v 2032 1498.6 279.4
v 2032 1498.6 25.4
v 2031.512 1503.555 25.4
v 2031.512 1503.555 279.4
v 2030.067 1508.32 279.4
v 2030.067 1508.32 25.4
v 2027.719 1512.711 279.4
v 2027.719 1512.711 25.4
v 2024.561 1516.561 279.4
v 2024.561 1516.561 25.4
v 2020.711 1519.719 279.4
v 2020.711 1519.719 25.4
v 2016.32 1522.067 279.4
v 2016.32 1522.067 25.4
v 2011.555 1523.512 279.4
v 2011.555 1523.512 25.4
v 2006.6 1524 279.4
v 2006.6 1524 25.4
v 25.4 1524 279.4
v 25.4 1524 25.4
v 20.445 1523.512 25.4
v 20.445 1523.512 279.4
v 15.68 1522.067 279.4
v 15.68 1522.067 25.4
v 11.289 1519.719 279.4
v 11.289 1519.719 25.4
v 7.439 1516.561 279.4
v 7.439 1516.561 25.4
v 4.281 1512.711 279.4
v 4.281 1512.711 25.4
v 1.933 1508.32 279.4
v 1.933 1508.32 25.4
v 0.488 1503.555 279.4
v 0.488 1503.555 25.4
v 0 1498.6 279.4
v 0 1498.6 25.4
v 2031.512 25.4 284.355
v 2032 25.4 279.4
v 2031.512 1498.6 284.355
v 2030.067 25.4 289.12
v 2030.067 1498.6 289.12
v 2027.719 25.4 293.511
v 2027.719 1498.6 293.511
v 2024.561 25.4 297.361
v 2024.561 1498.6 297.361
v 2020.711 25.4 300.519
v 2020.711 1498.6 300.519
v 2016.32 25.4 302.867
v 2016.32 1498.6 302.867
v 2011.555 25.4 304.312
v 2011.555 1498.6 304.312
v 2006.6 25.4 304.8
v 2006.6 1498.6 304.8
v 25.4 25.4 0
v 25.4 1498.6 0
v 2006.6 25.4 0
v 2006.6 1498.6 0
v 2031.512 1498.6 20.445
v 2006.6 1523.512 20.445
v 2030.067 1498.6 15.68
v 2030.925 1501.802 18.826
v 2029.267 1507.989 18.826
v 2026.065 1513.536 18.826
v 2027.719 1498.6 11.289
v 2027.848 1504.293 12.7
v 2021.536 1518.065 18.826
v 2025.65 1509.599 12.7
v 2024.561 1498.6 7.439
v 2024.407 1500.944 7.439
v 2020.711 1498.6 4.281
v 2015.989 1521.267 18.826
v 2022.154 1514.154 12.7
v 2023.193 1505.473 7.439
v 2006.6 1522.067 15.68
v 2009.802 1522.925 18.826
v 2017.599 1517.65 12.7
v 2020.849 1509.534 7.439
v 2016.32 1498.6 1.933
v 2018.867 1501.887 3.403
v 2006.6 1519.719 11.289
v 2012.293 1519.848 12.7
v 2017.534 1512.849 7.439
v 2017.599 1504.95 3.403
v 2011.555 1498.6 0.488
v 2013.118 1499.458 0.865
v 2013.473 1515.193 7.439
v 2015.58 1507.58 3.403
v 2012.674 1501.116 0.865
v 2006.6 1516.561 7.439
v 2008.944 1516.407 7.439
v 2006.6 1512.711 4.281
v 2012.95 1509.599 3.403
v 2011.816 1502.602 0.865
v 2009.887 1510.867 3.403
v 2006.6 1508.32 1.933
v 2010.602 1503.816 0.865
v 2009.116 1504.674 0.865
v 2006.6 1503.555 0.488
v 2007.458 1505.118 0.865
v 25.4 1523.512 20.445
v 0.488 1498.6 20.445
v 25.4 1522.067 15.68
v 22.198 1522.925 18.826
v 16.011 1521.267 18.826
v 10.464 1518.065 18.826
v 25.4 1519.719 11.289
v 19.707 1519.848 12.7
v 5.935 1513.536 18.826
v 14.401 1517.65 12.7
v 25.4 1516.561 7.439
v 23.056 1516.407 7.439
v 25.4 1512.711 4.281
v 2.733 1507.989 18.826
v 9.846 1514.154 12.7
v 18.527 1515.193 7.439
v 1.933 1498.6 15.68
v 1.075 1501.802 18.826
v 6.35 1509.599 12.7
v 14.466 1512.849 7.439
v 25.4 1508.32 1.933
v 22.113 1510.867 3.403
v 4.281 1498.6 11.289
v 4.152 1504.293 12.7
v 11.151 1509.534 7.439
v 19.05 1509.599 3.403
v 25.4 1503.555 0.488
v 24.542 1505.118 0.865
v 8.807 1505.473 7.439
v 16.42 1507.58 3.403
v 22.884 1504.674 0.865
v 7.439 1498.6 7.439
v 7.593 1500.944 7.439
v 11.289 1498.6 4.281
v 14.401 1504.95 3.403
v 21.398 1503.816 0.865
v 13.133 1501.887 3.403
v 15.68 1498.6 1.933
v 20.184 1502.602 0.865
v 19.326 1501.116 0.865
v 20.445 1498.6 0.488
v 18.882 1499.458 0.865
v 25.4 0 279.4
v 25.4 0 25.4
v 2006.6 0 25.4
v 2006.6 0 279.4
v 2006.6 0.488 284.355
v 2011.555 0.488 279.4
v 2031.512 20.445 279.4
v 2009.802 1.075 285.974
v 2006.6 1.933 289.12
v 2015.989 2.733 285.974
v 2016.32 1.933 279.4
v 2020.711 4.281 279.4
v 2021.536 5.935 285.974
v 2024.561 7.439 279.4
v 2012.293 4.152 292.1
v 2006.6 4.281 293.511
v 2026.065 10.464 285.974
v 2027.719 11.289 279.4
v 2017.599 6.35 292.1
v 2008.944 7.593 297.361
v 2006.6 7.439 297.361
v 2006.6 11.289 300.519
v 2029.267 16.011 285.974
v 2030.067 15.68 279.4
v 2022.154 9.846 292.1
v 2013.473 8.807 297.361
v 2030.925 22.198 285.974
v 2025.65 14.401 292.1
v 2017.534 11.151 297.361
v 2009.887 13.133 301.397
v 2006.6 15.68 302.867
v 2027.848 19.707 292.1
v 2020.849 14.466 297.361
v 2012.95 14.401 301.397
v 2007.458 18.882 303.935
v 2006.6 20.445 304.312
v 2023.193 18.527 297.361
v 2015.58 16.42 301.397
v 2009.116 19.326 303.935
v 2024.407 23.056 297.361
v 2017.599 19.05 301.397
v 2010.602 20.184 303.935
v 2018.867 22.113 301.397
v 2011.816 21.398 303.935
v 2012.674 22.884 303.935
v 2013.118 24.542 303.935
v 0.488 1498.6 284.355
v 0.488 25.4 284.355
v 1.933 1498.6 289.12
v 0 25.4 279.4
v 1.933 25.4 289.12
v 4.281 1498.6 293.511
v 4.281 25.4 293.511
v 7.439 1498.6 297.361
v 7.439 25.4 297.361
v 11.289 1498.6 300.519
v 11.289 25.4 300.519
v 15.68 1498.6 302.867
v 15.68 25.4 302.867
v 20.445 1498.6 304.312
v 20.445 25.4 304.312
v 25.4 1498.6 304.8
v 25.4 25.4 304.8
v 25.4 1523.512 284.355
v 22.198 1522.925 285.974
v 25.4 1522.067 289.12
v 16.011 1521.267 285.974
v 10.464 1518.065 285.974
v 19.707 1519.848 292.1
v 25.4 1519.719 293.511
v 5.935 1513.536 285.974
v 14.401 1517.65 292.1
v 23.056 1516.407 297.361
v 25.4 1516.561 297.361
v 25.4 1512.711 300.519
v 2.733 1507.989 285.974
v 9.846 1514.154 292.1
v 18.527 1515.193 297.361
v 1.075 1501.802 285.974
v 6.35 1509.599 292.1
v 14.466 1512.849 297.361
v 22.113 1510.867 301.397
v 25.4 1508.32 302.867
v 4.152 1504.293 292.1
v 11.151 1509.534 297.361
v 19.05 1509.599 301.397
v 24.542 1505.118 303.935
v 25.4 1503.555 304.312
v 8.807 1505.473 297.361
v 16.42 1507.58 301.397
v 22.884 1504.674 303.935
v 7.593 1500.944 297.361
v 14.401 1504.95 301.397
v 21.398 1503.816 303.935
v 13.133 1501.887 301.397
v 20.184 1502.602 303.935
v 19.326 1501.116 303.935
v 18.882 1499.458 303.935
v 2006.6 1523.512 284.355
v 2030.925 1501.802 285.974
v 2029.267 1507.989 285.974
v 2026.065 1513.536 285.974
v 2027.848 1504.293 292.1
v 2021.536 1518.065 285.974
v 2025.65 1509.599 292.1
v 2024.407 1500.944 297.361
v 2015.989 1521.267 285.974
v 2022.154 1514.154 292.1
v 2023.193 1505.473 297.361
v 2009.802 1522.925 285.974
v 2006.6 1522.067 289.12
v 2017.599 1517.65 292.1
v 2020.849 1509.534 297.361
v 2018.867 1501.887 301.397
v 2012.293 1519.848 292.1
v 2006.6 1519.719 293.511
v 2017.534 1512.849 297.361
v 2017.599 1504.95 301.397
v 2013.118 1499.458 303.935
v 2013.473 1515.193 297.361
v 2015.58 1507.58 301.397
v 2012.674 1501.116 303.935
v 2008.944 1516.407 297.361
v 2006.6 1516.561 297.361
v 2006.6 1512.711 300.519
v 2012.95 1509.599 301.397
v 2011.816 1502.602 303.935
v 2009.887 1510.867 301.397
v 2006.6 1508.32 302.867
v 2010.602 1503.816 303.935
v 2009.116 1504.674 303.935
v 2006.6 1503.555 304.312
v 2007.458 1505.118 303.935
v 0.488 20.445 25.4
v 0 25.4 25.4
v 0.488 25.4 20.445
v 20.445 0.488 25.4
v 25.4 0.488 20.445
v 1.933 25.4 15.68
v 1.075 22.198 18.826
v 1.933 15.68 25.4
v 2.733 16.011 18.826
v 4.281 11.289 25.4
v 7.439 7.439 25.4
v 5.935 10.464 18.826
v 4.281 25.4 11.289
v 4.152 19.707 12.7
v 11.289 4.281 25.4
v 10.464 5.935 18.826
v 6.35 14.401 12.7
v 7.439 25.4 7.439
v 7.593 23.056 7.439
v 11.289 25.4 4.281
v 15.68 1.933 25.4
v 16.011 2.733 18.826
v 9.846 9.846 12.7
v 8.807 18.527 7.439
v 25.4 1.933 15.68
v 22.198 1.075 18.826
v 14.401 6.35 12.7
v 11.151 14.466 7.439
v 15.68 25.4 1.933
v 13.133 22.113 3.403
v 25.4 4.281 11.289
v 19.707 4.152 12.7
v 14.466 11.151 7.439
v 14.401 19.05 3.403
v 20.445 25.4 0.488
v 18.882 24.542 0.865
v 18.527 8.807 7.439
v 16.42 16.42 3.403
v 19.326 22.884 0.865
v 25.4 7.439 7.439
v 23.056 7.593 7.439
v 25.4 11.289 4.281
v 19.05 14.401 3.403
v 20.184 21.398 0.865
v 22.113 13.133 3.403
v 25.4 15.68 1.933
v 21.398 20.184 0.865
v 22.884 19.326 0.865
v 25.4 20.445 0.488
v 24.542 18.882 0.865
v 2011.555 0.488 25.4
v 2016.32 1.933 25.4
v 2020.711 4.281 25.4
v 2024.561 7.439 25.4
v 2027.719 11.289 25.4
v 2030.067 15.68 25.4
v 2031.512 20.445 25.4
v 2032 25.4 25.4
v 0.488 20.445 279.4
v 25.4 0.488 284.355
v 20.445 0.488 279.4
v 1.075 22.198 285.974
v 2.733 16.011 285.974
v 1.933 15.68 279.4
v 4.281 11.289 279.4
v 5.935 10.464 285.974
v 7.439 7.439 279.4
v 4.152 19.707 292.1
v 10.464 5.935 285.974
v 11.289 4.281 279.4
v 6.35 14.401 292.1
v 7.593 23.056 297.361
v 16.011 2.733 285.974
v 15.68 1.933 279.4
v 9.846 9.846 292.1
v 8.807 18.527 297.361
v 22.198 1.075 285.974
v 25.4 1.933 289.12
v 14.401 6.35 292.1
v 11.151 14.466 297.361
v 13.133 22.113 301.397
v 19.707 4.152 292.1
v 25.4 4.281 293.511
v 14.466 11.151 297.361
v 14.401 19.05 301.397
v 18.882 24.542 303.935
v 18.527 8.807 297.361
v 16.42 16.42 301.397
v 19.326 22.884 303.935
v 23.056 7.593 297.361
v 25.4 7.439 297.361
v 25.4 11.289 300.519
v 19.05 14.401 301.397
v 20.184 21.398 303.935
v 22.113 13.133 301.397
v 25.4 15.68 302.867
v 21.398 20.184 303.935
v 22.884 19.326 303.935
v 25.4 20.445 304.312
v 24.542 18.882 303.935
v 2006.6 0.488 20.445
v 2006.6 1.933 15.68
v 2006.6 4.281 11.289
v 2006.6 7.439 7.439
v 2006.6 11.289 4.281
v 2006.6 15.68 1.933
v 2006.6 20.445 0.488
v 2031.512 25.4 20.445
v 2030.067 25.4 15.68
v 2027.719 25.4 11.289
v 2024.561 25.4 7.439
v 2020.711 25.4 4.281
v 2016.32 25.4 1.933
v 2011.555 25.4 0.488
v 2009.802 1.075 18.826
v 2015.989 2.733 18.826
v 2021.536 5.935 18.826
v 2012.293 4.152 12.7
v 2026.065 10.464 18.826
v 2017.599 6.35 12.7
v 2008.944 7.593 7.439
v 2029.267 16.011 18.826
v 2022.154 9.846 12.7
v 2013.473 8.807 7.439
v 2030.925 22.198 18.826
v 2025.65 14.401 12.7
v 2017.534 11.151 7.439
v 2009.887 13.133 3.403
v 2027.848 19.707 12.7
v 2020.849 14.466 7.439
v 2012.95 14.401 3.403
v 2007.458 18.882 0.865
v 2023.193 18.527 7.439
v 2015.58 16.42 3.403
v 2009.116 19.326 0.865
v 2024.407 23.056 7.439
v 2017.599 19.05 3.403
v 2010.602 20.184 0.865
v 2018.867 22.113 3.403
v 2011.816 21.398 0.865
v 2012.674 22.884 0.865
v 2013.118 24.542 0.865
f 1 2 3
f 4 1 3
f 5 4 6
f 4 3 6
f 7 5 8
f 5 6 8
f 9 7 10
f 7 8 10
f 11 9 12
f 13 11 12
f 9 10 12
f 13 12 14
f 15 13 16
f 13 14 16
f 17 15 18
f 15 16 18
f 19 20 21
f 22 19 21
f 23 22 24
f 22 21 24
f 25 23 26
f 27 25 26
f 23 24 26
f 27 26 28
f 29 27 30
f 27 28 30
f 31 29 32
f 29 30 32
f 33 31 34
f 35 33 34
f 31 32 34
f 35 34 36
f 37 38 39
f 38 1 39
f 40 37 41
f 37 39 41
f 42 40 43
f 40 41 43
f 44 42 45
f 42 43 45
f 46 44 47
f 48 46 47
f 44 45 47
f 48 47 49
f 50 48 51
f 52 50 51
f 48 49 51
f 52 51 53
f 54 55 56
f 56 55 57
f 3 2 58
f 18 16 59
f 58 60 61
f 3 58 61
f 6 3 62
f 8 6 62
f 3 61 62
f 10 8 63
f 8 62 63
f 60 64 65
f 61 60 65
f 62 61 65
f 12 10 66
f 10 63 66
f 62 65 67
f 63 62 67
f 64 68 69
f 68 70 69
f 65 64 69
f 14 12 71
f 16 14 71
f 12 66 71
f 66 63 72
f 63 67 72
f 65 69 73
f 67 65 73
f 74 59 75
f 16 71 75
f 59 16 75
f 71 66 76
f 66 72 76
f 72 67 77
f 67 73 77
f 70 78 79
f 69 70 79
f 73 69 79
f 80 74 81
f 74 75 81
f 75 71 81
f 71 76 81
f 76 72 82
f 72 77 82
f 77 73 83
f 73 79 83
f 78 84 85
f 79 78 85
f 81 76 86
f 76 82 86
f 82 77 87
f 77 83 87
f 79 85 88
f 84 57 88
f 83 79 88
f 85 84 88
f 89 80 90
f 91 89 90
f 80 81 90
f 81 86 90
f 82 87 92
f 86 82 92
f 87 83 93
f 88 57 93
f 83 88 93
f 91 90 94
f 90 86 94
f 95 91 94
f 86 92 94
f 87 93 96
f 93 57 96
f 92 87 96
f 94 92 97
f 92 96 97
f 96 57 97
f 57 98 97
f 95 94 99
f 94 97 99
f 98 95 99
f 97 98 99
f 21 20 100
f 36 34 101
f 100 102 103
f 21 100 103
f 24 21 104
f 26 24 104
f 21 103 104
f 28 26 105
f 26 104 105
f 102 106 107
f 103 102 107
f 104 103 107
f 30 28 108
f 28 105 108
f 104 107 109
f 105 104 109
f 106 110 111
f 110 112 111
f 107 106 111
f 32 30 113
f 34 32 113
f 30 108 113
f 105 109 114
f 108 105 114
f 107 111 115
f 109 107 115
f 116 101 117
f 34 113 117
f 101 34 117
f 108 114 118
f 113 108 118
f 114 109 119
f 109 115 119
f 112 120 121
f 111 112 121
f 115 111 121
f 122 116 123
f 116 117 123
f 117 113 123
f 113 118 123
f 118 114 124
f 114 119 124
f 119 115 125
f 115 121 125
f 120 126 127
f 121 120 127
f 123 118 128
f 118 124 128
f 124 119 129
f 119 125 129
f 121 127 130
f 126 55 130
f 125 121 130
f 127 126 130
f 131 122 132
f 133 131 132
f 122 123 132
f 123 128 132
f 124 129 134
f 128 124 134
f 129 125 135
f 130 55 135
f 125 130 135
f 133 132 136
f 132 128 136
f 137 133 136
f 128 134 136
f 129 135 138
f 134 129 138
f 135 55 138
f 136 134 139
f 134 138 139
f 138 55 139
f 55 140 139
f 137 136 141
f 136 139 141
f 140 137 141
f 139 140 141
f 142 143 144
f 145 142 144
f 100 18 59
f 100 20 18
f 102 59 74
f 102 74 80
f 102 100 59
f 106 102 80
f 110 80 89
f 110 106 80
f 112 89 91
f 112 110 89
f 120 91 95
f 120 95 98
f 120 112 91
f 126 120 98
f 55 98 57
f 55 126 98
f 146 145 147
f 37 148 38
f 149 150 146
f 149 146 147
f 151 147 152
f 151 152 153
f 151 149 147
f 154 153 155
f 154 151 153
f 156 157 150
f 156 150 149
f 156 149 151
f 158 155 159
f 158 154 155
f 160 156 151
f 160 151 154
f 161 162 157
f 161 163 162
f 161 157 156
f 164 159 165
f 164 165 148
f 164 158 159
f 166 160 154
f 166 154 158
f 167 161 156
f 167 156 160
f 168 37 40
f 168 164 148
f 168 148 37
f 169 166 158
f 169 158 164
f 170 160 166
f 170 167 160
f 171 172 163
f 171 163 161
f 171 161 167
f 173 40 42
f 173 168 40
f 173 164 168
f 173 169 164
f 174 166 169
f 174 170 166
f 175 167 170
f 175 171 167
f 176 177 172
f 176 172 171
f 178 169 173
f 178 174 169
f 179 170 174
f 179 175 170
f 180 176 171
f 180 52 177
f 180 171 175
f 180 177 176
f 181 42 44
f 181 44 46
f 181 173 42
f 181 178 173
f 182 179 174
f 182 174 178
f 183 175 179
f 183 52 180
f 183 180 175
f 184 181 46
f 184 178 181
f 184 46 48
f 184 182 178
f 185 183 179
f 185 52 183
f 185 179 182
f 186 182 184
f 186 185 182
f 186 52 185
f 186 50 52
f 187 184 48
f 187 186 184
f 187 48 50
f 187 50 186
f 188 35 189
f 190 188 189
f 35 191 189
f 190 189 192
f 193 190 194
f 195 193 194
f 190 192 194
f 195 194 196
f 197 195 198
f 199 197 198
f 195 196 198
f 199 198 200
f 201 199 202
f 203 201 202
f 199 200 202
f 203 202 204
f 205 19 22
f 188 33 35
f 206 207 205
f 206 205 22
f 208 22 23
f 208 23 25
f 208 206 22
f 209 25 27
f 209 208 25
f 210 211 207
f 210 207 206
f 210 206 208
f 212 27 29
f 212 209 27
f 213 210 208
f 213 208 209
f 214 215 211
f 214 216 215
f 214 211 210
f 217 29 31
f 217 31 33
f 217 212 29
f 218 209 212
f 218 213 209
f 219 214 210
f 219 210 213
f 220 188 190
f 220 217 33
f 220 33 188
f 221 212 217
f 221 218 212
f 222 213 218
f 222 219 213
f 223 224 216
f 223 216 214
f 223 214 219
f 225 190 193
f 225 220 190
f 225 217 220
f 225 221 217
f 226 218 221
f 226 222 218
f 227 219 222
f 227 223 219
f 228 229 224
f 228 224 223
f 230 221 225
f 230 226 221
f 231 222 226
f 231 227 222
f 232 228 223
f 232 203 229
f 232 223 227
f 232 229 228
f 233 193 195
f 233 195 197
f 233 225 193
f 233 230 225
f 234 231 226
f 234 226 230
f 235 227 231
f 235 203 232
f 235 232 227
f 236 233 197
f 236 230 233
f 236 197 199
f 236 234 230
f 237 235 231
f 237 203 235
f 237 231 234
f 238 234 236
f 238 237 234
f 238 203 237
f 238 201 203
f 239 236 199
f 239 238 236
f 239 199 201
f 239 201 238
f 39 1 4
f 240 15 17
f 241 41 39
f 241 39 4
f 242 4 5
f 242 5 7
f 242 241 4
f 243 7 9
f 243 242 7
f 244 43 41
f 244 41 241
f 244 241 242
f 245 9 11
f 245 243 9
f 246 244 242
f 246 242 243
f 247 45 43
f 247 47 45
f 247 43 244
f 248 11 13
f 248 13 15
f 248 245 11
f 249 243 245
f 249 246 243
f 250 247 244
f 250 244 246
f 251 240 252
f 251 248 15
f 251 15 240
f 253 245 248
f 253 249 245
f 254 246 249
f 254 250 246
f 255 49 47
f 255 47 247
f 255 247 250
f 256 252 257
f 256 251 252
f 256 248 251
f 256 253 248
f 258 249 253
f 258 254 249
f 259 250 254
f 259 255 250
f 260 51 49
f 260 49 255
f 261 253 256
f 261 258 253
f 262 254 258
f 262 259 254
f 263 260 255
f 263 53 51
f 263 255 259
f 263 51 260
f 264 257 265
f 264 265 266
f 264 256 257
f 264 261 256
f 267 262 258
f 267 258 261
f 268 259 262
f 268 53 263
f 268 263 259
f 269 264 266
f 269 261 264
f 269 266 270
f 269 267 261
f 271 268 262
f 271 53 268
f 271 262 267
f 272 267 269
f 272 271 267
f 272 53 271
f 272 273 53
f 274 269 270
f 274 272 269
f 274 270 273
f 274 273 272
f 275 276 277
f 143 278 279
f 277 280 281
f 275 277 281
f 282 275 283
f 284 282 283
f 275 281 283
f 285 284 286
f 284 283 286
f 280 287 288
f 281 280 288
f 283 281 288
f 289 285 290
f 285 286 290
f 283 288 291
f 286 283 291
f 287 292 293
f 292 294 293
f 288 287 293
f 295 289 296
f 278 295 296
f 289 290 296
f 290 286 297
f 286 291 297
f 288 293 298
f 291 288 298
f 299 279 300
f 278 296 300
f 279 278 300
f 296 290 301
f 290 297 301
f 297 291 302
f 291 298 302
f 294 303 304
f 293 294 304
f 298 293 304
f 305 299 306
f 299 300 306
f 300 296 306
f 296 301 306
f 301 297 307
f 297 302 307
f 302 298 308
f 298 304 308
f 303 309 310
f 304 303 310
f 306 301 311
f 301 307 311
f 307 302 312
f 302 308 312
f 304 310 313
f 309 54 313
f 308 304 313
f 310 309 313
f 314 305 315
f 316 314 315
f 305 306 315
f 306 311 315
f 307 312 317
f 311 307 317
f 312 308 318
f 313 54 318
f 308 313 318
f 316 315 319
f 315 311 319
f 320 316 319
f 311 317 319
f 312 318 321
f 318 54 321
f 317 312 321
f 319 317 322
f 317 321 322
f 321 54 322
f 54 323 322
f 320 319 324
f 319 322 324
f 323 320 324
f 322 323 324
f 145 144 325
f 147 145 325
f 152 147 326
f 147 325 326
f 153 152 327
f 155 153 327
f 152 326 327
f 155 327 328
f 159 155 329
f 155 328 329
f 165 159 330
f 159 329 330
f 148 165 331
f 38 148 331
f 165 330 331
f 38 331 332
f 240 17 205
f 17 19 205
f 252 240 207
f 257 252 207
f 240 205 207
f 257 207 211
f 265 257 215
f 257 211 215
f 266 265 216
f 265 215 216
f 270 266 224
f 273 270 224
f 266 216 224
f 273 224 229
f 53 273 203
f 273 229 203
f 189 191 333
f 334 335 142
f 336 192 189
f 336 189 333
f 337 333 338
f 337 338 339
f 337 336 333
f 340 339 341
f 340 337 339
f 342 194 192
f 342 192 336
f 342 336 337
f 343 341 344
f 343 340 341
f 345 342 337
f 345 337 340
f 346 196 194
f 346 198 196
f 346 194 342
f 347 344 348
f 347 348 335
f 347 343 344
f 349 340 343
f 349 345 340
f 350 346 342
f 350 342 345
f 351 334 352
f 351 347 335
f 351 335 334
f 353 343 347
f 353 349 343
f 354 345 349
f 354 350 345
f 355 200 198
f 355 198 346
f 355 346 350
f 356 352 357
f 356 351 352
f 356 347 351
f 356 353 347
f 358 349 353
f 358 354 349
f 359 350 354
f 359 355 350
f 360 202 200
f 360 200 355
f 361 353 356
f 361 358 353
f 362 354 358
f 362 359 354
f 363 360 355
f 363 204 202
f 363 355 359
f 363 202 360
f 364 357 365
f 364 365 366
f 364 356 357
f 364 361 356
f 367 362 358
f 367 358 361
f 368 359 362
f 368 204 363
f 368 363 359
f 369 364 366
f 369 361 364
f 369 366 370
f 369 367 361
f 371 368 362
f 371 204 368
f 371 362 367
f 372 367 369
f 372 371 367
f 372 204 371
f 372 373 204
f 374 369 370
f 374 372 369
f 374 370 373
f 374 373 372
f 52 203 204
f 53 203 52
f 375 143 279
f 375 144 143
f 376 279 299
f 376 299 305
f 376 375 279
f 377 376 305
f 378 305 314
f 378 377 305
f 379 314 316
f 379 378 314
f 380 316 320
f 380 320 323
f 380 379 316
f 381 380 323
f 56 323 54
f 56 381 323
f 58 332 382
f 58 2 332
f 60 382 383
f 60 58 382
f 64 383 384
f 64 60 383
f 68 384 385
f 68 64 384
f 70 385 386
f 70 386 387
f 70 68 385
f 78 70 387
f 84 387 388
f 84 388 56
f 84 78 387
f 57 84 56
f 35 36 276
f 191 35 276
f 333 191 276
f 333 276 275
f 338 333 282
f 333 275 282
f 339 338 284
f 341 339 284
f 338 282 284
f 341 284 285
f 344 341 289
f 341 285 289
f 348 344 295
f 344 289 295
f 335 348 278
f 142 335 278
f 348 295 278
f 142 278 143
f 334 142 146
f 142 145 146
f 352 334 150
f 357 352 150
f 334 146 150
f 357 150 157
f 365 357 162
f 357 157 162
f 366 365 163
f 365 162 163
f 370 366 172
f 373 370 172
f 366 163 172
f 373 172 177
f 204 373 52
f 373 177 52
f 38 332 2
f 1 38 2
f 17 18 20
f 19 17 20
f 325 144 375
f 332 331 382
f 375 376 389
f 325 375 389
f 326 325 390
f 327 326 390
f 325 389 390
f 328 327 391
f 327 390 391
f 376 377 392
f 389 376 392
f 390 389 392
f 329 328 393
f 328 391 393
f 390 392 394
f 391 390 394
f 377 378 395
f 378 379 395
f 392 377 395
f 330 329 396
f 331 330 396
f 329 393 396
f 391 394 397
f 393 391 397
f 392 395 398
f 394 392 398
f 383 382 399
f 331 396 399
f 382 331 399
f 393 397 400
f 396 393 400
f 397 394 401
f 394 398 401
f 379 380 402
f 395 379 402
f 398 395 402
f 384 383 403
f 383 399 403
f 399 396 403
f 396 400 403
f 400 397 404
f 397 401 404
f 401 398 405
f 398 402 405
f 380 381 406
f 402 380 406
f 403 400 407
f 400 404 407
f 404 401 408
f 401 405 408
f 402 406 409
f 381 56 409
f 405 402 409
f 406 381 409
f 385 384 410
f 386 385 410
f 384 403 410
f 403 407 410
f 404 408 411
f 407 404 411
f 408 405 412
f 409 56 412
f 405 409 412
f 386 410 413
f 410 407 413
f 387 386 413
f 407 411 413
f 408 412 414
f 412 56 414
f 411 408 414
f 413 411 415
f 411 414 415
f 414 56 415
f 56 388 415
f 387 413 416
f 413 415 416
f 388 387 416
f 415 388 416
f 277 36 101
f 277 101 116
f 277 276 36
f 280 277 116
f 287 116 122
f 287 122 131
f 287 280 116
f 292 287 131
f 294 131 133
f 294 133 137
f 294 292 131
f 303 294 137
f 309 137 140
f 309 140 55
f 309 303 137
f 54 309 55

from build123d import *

# Parameters (mm, degrees)
F1_DEPTH = 304.8
F2_R     = 25.4


with BuildPart() as f1:
    # F0 (on Top) → F1 (new body)
    with BuildSketch(Plane.XY):
        with BuildLine():
            ThreePointArc((0, 25.4), (7.4394877579, 7.4394877579), (25.4, 0))
            Line((25.4, 0), (2006.6, 0))
            ThreePointArc((2006.6, 0), (2024.5605122421, 7.4394877579), (2032, 25.4))
            Line((2032, 25.4), (2032, 1498.6))
            ThreePointArc((2032, 1498.6), (2024.5605122421, 1516.5605122421), (2006.6, 1524))
            Line((2006.6, 1524), (25.4, 1524))
            ThreePointArc((25.4, 1524), (7.4394877579, 1516.5605122421), (0, 1498.6))
            Line((0, 1498.6), (0, 25.4))
        make_face()
    extrude(amount=F1_DEPTH)

    # F2
    f2_edges = [f1.edges().sort_by_distance(p)[0] for p in [
        (1016, 0, 304.8),
        (1016, 0, 0),
    ]]
    fillet(f2_edges, radius=F2_R)


solid = f1.part
